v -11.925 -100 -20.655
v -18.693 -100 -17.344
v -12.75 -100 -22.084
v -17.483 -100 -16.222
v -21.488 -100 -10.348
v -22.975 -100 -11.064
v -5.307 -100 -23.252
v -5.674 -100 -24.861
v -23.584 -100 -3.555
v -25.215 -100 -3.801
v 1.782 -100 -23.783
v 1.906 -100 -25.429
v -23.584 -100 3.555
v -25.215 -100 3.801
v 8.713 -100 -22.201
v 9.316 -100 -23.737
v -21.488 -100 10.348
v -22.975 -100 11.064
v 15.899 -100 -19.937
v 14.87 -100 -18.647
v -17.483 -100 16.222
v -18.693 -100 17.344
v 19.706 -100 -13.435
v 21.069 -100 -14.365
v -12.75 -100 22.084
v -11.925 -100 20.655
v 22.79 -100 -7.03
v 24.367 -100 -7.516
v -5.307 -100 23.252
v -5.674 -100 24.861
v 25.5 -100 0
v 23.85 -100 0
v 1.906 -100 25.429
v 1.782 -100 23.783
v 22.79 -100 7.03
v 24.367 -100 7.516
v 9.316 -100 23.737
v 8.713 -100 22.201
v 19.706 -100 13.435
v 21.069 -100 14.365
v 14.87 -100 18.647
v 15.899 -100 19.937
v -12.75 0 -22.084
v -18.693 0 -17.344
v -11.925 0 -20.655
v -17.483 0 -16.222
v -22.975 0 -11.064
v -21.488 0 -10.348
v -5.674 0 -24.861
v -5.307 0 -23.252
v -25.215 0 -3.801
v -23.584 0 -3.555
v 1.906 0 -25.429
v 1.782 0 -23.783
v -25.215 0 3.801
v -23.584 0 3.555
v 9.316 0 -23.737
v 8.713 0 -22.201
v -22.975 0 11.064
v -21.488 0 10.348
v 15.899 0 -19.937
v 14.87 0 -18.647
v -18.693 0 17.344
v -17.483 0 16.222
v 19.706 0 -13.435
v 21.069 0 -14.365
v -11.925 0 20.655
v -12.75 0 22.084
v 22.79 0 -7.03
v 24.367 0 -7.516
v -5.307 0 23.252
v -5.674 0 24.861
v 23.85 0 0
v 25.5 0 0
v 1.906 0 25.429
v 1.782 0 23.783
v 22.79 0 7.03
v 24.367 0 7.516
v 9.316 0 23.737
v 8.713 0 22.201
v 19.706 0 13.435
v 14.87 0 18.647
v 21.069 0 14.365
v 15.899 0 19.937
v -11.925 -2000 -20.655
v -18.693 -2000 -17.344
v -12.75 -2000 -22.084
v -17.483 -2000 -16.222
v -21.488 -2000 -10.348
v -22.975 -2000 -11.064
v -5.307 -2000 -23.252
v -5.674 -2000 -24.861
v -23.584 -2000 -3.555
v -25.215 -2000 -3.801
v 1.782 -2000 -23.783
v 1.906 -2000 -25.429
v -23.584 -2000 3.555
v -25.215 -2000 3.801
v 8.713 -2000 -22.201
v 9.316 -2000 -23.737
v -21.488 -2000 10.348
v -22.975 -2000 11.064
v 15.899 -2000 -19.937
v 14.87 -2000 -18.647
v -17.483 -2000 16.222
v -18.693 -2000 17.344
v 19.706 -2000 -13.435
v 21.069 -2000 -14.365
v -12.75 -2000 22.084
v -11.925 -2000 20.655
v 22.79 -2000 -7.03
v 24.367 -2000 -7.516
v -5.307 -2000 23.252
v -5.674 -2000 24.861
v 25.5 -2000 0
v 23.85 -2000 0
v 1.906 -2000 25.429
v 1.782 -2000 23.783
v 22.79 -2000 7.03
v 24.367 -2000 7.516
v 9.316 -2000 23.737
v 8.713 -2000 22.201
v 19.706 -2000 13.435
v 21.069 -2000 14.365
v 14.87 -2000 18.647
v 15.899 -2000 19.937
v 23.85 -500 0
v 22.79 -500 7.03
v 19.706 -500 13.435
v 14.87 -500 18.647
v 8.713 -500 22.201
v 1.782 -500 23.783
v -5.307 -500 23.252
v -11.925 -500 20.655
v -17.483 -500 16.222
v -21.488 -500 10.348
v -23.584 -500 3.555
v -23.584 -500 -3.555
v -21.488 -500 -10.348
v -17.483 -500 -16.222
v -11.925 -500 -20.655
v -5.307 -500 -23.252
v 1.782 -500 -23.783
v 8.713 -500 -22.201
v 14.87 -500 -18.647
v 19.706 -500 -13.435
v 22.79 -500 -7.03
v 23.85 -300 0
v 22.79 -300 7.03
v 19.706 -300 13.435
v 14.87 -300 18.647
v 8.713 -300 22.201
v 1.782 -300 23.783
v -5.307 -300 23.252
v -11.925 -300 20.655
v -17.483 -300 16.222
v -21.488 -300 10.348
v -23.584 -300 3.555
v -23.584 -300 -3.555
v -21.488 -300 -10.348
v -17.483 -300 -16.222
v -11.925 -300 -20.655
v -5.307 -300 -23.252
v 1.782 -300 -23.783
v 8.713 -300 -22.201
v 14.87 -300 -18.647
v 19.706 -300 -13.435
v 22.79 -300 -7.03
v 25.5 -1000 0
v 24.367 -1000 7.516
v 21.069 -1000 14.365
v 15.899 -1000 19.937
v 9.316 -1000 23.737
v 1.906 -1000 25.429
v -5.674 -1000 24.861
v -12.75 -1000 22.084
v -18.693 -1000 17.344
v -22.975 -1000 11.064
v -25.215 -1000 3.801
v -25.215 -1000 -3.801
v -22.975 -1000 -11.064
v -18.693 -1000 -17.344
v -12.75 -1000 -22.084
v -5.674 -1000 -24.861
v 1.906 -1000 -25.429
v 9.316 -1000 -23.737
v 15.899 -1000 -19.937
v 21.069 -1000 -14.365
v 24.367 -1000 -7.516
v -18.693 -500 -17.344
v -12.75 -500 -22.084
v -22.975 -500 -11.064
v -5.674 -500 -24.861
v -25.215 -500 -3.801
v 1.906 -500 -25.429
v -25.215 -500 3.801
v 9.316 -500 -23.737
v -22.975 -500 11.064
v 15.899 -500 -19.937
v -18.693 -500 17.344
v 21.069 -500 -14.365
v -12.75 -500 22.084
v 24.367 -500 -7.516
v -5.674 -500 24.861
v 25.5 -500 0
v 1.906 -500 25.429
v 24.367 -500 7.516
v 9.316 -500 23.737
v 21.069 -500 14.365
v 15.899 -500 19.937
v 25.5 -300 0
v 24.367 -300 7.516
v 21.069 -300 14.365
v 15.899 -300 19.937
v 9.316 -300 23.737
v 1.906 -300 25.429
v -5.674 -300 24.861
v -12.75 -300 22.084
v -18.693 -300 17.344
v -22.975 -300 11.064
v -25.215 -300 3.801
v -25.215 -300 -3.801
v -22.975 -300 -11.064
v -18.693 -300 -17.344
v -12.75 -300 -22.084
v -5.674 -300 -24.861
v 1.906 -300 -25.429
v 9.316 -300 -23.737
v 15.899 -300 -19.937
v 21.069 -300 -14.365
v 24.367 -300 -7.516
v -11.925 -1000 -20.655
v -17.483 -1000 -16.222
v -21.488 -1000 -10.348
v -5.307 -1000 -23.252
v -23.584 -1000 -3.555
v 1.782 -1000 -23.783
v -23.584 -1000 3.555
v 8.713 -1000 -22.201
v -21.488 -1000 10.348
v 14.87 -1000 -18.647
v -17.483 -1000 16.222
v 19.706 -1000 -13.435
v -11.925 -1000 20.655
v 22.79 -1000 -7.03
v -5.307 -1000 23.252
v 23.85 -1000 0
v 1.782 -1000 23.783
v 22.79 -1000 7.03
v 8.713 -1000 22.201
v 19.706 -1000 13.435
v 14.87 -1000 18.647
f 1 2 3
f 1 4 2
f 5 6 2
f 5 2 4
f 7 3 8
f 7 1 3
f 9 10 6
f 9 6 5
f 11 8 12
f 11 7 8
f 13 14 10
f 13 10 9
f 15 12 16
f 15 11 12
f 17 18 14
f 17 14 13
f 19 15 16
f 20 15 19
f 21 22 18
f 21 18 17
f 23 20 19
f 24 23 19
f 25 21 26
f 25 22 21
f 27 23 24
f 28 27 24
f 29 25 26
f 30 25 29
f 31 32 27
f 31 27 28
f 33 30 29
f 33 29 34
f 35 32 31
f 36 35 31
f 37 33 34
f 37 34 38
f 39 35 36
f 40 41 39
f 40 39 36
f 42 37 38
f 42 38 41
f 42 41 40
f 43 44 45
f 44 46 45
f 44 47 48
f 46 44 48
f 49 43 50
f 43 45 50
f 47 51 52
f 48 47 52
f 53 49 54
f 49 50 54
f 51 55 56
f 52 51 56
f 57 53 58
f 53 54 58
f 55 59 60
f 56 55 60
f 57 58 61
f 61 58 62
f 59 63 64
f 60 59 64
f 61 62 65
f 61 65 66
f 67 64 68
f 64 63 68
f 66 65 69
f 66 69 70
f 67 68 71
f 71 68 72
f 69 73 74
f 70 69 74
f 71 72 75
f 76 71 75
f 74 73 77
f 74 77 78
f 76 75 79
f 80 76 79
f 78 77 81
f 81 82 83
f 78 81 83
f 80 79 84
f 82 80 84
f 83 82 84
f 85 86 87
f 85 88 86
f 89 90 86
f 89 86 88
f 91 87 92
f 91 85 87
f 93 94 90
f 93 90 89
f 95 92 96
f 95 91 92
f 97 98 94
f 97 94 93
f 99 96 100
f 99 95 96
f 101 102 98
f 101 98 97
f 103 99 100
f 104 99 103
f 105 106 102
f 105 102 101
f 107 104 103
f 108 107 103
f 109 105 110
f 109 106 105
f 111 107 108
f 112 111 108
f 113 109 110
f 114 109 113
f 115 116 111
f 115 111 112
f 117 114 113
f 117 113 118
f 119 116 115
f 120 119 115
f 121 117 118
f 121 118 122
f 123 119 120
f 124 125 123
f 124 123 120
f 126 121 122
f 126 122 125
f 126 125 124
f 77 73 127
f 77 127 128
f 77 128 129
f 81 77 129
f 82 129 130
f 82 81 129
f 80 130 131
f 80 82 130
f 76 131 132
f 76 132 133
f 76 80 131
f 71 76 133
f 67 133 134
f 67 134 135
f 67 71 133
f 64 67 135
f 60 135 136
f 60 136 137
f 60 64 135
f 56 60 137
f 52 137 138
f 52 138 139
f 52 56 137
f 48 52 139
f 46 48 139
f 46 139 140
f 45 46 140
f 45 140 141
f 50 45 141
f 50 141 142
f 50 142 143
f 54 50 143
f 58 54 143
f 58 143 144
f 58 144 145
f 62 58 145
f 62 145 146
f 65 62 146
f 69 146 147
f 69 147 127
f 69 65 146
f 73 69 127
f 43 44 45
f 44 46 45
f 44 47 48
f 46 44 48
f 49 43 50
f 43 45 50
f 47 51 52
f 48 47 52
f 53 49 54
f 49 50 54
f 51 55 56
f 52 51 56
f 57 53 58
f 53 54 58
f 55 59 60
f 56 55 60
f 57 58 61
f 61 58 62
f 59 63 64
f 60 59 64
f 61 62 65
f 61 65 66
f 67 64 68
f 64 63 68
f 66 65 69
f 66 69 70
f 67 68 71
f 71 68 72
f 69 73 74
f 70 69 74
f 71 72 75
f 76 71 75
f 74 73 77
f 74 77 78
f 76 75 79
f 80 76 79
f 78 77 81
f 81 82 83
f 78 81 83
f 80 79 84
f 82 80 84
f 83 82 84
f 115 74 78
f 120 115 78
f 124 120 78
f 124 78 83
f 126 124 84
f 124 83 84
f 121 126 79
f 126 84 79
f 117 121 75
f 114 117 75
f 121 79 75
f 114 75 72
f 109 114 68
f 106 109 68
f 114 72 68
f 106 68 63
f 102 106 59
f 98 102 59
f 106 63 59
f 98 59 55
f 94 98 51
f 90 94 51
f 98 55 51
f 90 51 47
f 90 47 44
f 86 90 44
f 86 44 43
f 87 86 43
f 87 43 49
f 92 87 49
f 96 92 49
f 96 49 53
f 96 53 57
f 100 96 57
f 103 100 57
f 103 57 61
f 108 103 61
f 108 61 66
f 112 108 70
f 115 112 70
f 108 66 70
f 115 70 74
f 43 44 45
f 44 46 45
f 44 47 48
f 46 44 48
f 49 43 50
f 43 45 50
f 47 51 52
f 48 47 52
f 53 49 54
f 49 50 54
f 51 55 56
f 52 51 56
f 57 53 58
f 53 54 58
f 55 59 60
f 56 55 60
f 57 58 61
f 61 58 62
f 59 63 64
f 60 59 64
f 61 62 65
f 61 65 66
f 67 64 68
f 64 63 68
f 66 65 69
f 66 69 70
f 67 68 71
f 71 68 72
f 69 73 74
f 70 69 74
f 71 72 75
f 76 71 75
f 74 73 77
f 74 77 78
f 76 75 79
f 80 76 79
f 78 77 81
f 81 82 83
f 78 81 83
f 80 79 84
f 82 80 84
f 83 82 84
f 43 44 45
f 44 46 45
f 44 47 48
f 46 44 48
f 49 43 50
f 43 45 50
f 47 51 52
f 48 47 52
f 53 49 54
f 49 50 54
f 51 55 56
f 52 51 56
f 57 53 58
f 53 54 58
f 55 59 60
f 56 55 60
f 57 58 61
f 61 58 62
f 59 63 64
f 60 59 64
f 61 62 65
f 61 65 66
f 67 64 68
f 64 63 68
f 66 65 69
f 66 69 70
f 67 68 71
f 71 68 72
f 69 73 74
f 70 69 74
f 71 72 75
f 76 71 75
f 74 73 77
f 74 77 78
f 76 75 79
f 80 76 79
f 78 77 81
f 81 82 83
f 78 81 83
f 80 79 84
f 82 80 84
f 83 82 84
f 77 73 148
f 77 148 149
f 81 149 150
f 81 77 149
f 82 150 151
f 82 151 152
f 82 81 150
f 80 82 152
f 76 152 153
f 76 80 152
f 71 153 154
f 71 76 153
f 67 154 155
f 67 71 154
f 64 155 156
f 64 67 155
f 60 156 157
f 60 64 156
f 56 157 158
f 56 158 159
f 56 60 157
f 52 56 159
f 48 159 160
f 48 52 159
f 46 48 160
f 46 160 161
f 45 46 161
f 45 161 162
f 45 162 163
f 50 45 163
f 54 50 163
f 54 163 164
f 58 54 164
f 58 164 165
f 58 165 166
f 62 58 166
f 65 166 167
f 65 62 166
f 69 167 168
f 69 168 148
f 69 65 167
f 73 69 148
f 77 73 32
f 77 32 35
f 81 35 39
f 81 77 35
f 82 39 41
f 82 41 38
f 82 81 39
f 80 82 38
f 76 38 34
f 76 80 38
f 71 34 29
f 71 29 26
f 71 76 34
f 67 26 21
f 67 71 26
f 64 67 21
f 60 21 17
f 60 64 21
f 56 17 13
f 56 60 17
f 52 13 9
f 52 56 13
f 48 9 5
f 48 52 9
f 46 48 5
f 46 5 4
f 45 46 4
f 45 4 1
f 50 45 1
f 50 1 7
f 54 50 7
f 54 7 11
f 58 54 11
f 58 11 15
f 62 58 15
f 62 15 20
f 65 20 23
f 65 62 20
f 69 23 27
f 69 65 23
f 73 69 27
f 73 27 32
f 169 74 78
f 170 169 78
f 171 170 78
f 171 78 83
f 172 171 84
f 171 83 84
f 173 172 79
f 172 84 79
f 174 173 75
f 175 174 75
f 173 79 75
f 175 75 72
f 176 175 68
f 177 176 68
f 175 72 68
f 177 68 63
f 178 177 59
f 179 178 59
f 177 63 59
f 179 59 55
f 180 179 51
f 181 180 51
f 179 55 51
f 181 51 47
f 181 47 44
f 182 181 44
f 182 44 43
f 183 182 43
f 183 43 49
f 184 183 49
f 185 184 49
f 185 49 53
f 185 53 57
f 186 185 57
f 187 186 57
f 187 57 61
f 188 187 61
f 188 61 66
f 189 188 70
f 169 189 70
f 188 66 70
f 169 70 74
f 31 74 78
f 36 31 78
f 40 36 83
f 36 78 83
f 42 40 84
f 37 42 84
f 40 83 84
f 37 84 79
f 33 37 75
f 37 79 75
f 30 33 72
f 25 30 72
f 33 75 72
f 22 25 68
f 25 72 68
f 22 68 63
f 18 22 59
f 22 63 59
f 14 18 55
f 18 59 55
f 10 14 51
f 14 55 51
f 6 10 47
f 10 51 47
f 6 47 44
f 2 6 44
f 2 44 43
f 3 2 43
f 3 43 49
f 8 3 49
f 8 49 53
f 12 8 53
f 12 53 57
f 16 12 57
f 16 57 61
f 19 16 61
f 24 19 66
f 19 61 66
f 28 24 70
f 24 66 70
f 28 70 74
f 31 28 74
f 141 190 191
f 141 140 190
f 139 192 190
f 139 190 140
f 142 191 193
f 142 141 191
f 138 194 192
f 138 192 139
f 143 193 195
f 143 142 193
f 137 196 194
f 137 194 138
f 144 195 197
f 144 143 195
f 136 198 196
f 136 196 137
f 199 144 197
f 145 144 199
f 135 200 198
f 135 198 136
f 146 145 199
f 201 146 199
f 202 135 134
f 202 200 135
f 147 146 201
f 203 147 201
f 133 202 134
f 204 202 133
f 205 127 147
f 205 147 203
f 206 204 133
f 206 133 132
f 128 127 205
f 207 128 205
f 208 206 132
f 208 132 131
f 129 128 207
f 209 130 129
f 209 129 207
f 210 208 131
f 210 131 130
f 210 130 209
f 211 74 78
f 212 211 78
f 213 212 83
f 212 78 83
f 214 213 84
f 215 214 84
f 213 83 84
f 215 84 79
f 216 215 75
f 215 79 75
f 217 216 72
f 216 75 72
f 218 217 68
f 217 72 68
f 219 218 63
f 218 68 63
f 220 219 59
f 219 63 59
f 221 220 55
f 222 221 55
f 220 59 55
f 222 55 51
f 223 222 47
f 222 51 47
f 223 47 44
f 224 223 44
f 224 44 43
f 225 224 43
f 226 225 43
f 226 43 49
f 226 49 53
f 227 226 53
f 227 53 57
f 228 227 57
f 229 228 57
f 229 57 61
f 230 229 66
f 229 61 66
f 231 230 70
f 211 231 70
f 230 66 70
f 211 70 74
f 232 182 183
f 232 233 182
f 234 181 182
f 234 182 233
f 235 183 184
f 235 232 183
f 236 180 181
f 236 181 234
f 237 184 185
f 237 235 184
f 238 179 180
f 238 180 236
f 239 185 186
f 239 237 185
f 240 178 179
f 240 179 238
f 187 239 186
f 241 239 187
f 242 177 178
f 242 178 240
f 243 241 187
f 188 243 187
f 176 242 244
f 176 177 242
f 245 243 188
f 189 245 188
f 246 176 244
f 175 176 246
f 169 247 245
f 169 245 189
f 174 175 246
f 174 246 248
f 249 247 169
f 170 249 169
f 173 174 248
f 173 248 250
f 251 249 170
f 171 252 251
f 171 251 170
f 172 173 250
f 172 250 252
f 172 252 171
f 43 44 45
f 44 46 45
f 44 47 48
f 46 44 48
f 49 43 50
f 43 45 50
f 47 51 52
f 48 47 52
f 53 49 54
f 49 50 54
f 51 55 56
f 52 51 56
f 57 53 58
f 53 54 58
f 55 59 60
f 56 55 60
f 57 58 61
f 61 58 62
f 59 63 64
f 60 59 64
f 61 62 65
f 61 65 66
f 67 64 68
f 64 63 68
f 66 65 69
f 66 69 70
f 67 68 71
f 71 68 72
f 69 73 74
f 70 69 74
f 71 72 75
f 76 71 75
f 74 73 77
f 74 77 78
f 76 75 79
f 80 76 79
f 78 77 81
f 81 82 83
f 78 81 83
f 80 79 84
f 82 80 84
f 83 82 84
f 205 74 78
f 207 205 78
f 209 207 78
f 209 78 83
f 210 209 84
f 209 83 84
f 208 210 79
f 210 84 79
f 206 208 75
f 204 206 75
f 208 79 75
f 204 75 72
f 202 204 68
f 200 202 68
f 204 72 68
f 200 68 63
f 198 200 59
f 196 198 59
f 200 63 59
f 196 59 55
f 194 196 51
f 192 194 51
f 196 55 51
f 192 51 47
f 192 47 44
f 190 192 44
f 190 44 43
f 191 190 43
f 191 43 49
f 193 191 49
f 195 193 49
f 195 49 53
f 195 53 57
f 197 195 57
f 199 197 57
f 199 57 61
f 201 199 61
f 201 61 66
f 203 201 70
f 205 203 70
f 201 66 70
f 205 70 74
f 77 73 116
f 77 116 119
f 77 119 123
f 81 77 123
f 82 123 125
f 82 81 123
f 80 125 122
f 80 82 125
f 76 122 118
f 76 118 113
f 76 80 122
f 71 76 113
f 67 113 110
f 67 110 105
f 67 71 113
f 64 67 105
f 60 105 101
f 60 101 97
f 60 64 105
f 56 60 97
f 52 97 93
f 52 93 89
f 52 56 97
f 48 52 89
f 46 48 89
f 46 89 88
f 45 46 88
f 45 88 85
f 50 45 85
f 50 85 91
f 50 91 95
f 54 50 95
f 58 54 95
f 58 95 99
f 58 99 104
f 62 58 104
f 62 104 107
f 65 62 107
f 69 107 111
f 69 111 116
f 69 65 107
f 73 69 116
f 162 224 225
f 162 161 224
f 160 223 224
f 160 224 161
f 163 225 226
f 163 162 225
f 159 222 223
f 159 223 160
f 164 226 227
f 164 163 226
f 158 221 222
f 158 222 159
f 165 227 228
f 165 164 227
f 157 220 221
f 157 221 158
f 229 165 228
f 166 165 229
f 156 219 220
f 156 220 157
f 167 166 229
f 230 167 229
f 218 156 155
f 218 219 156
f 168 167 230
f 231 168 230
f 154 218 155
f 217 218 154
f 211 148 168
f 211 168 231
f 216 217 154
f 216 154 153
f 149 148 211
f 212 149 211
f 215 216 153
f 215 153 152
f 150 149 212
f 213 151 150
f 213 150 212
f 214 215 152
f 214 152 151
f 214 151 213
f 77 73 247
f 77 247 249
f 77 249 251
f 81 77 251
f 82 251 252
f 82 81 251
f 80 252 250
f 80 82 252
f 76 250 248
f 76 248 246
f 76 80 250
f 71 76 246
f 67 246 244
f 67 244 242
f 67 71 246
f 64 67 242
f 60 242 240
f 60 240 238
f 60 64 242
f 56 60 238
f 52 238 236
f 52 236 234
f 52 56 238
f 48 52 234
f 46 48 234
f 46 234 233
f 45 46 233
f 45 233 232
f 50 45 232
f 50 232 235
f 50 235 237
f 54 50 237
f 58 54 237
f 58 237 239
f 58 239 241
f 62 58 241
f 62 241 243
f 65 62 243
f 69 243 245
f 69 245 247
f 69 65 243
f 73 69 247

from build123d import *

# Parameters (mm, degrees)
F0_R     = 25.5
F0_R_2   = 23.85
F1_DEPTH = 1000
F2_DEPTH = 500
F3_DEPTH = 300
F4_DEPTH = 100
F5_DEPTH = 2000


with BuildPart() as f1:
    # F0 (on Front) → F1 (new body)
    with BuildSketch(Plane.XZ):
        Circle(F0_R)
        Circle(F0_R_2, mode=Mode.SUBTRACT)
    extrude(amount=F1_DEPTH)


with BuildPart() as f2:
    # F0 (on Front) → F2 (new body)
    with BuildSketch(Plane.XZ):
        Circle(F0_R)
        Circle(F0_R_2, mode=Mode.SUBTRACT)
    extrude(amount=F2_DEPTH)


with BuildPart() as f3:
    # F0 (on Front) → F3 (new body)
    with BuildSketch(Plane.XZ):
        Circle(F0_R)
        Circle(F0_R_2, mode=Mode.SUBTRACT)
    extrude(amount=F3_DEPTH)


with BuildPart() as f4:
    # F0 (on Front) → F4 (new body)
    with BuildSketch(Plane.XZ):
        Circle(F0_R)
        Circle(F0_R_2, mode=Mode.SUBTRACT)
    extrude(amount=F4_DEPTH)


with BuildPart() as f5:
    # F0 (on Front) → F5 (new body)
    with BuildSketch(Plane.XZ):
        Circle(F0_R)
        Circle(F0_R_2, mode=Mode.SUBTRACT)
    extrude(amount=F5_DEPTH)


solid = Compound([f1.part, f2.part, f3.part, f4.part, f5.part])
